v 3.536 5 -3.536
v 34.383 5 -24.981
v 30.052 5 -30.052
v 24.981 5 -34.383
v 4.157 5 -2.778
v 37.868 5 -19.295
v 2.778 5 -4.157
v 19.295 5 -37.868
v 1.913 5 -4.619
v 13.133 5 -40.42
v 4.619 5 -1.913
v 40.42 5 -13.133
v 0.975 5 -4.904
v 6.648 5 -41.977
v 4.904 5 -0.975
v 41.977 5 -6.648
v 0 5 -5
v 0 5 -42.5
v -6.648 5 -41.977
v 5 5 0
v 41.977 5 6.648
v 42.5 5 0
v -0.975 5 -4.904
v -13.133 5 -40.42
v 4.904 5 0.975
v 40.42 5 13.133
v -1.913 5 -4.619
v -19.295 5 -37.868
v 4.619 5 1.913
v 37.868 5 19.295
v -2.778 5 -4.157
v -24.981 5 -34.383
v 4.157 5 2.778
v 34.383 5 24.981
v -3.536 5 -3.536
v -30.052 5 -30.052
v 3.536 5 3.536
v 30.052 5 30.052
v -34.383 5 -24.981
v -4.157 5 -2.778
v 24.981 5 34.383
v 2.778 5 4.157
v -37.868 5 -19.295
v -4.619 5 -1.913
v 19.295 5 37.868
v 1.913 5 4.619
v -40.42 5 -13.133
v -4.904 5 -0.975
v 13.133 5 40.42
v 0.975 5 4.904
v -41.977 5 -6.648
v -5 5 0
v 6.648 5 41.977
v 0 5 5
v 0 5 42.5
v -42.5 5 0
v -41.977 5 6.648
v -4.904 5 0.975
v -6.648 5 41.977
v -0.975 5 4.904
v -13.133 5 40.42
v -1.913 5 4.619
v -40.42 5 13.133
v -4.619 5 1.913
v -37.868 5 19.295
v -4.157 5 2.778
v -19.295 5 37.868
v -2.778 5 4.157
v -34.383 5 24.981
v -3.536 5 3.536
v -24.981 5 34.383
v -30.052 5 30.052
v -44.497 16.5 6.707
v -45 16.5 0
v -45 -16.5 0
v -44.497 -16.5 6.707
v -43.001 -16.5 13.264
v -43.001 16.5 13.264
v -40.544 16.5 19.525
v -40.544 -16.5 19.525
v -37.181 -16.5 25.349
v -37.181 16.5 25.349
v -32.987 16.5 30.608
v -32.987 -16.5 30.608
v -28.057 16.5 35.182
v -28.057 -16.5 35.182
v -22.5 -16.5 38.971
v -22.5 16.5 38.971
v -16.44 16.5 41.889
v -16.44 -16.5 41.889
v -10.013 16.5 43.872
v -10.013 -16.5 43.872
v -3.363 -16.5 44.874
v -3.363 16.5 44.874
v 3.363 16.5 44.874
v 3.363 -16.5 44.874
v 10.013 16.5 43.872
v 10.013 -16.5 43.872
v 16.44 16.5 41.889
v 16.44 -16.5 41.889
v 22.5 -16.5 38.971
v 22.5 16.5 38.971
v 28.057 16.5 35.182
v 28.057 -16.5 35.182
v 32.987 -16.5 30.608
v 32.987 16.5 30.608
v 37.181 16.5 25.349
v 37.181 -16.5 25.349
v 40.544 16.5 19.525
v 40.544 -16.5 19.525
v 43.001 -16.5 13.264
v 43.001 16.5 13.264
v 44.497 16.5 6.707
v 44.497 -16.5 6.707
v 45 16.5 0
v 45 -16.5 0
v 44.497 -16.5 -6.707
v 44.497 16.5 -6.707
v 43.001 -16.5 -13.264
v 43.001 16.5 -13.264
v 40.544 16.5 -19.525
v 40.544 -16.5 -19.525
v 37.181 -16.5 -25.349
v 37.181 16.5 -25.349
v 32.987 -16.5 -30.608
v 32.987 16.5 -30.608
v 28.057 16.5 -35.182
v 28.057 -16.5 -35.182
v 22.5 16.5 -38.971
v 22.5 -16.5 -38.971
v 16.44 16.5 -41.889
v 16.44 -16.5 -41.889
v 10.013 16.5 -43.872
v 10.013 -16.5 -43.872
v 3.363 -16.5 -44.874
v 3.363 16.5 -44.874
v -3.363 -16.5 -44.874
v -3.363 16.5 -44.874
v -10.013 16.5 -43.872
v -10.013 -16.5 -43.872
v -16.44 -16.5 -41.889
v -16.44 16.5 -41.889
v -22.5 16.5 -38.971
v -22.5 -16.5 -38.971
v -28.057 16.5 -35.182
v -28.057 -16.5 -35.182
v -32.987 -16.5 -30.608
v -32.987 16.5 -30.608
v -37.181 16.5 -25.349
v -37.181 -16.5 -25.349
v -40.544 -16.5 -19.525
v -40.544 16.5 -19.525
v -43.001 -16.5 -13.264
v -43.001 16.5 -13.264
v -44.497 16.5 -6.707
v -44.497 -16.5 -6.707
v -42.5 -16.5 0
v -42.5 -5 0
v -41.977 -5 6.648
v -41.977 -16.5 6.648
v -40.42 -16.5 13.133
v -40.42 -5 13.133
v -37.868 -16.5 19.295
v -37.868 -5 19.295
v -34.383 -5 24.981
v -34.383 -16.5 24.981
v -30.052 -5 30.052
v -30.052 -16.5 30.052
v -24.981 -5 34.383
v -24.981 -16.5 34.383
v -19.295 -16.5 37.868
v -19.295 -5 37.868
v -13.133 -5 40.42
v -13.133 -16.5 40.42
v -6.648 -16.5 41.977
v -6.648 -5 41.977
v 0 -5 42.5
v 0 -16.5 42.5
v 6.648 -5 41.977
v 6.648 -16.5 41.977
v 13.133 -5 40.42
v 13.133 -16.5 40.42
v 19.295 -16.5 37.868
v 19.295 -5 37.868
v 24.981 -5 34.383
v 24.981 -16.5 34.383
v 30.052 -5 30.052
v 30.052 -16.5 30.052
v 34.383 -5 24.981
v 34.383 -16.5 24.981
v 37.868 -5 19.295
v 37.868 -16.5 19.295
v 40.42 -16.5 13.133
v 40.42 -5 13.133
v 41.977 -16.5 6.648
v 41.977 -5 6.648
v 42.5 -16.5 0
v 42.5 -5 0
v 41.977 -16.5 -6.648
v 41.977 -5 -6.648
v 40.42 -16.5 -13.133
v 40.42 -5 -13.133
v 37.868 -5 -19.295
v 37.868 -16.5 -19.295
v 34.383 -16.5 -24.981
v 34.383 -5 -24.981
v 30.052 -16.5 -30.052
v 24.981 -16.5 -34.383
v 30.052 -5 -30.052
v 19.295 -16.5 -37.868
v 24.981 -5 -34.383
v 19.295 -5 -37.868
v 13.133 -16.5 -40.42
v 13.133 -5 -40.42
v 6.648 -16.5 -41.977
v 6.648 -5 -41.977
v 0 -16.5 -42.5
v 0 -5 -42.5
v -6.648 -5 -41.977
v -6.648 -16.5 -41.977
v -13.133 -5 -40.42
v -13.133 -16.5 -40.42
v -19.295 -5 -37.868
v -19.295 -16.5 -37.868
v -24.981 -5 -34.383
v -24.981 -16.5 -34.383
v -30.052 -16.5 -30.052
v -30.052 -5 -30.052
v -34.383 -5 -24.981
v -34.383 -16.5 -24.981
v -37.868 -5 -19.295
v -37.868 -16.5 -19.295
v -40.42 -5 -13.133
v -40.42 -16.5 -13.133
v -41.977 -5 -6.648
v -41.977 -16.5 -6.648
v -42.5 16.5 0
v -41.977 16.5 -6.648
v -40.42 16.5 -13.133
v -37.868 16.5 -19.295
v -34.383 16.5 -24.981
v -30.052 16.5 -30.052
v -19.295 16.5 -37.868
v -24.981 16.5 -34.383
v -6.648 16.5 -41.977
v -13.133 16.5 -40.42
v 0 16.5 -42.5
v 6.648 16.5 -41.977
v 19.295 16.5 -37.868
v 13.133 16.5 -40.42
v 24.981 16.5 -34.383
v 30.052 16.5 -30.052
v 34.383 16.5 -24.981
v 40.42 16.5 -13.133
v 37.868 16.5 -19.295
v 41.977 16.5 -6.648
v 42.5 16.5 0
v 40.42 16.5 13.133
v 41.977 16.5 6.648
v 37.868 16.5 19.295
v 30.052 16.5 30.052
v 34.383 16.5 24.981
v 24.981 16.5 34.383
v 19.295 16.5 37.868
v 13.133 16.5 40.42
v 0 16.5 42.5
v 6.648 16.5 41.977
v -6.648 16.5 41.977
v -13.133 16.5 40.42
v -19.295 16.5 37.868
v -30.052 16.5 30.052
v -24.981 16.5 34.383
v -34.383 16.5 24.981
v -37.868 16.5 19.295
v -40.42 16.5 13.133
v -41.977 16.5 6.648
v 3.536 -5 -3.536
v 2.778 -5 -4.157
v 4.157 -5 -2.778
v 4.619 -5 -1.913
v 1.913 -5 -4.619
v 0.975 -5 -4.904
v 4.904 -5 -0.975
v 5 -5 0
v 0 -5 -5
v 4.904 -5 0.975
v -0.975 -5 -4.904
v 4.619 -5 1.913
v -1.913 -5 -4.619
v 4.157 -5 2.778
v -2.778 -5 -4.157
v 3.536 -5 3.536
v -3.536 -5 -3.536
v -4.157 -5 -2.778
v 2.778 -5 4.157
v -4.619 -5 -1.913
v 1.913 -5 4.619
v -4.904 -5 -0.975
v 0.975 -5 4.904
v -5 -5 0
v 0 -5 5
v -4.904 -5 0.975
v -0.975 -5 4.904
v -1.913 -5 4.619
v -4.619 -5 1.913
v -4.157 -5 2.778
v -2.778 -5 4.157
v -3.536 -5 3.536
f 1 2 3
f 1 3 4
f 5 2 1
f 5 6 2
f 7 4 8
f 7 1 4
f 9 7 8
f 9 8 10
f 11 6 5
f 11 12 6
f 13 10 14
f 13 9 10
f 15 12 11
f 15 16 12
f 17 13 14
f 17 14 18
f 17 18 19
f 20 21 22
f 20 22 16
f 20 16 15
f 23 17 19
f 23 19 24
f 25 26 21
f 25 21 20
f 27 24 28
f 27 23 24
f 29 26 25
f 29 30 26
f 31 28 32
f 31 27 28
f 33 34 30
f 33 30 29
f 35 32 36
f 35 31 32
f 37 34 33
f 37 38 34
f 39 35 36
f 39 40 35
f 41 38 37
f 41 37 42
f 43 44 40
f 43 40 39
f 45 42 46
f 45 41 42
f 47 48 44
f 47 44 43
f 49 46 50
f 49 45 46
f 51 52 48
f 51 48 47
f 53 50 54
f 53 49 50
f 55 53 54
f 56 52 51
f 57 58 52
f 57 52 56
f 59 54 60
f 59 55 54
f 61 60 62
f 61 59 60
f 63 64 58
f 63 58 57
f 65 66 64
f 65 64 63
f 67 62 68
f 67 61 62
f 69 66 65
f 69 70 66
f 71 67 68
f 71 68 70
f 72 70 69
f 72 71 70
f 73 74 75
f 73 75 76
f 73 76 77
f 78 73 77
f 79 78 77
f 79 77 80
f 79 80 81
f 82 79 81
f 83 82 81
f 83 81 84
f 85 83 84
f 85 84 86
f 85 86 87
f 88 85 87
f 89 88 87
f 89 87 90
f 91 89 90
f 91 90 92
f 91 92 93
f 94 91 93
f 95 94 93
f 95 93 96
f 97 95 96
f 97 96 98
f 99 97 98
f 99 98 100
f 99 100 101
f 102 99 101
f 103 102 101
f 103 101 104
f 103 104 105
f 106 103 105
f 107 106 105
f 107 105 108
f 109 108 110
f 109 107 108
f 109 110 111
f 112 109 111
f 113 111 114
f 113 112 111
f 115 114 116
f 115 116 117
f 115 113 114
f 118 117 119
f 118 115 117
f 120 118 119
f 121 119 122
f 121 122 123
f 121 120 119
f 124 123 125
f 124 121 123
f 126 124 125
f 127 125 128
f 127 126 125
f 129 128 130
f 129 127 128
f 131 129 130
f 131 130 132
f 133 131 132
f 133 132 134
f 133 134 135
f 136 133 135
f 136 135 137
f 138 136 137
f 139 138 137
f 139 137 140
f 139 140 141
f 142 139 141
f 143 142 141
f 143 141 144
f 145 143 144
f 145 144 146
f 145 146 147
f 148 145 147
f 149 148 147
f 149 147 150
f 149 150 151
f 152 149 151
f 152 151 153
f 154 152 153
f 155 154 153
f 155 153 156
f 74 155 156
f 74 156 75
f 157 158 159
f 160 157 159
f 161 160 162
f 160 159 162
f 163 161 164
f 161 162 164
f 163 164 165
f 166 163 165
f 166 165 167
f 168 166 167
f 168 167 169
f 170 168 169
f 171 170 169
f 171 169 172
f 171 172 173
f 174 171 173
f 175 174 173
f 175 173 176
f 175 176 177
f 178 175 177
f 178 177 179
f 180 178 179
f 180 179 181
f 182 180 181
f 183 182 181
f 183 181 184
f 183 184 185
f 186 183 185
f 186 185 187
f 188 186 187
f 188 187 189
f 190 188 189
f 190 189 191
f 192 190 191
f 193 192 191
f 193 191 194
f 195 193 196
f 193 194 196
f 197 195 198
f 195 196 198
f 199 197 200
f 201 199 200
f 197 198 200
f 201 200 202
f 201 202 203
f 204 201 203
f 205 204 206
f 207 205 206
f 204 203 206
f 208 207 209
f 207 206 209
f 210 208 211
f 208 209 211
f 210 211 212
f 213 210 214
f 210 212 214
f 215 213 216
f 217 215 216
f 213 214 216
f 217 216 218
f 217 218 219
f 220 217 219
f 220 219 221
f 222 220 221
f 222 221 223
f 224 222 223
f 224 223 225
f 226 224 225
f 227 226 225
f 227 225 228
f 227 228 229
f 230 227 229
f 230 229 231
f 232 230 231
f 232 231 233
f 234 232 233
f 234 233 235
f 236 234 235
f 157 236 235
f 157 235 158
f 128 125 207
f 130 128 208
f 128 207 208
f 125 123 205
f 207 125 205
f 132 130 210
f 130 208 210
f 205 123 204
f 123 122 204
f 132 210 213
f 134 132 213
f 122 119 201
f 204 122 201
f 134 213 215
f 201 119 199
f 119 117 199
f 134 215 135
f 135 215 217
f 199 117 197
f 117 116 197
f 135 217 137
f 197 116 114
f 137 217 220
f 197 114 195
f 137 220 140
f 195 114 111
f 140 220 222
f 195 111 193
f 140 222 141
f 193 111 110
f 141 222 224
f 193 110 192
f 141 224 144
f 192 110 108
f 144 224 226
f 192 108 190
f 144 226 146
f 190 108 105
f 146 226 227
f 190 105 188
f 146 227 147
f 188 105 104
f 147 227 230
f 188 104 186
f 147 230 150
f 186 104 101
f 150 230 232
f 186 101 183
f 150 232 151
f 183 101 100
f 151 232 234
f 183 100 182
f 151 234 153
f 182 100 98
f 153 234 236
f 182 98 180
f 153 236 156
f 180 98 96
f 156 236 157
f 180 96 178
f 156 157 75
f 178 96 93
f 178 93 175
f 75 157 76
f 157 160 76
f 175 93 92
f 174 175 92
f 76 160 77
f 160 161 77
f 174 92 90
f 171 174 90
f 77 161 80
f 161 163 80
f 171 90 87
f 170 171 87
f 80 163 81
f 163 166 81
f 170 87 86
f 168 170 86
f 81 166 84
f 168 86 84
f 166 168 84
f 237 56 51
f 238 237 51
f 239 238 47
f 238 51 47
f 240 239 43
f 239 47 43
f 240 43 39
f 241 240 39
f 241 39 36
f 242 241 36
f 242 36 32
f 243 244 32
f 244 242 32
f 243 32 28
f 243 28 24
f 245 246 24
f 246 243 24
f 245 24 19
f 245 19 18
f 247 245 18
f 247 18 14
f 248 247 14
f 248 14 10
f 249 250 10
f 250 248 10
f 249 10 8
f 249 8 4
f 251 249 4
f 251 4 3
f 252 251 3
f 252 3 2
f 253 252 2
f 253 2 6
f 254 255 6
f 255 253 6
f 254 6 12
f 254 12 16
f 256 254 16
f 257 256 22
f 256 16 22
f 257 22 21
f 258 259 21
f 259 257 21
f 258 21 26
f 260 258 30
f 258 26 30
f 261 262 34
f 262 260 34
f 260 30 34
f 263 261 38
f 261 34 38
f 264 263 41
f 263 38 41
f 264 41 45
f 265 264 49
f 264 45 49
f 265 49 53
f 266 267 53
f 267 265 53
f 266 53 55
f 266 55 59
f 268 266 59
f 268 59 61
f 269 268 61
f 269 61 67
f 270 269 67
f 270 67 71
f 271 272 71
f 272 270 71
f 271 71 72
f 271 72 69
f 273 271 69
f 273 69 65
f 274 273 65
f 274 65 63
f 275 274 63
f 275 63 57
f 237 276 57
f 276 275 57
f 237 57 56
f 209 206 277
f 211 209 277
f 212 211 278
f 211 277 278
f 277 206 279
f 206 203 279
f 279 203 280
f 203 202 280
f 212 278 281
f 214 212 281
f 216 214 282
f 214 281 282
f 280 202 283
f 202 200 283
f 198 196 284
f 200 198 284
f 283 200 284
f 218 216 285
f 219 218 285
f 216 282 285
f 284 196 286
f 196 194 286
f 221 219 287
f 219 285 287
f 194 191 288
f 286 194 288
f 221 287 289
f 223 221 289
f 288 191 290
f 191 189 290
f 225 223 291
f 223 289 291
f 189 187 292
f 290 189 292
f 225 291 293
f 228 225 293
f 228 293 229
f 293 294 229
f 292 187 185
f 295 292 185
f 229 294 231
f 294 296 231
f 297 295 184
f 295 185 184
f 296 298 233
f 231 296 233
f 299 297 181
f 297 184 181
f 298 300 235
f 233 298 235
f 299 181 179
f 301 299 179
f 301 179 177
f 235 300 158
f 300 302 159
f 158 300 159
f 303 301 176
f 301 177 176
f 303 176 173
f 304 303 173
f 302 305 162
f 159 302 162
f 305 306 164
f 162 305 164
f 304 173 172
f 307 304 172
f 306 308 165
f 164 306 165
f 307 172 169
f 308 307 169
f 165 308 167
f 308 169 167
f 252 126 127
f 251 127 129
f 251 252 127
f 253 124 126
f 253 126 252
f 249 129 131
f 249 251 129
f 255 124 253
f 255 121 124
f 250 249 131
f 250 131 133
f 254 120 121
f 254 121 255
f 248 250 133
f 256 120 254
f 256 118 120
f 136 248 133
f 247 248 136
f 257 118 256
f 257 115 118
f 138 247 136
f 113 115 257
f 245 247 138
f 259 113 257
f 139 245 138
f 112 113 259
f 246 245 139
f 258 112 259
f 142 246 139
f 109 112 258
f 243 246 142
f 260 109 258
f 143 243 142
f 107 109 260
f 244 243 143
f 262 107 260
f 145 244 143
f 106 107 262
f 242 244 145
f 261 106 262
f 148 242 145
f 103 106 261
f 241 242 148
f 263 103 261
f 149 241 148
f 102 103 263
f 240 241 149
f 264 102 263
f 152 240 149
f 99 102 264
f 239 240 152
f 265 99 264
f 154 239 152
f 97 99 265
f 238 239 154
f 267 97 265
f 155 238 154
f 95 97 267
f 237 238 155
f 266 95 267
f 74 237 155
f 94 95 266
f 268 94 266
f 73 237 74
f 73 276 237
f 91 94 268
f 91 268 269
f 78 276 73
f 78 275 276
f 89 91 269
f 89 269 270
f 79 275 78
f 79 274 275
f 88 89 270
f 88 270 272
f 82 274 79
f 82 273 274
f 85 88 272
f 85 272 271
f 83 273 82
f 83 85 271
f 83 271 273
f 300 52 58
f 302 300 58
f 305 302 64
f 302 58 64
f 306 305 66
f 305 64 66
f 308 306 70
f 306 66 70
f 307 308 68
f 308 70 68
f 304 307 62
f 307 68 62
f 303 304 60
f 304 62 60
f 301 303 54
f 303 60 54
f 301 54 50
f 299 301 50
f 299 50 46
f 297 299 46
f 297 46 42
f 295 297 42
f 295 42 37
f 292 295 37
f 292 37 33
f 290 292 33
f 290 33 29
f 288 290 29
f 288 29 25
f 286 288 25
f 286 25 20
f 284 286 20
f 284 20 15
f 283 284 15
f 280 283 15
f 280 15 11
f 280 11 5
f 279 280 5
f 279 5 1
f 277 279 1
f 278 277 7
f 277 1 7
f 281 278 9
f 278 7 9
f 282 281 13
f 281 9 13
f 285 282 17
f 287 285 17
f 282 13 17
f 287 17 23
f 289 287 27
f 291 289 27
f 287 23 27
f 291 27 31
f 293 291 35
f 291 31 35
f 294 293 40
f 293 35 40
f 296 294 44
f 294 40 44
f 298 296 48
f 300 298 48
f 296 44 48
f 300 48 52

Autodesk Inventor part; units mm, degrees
ref_plane "YZ Plane" through (0, 0, 0) normal (1, 0, 0) x (0, 1, 0)
ref_plane "XZ Plane" through (0, 0, 0) normal (0, 1, 0) x (-1, 0, 0)
ref_plane "XY Plane" through (0, 0, 0) normal (0, 0, 1) x (1, 0, 0)
sketch "Sketch1" plane through (0, 0, 0) normal (0, 1, 0) x (-1, 0, 0)
  circle A0 centre (0, 0) radius 42.5
  circle A1 centre (0, 0) radius 45
  circle A2 centre (0, 0) radius 5
  dimension "d0" = 85
  dimension "d3" = 90
  dimension "d6" = 10
extrude "Extrusion1" add sketch "Sketch1" along normal mid plane 10 contours A0 | A2
extrude "Extrusion2" add sketch "Sketch1" along normal mid plane 33 contours A1
extrude "Extrusion3" cut sketch "Sketch1" along normal mid plane 33 contours A2
properties part number "WheelCore"
